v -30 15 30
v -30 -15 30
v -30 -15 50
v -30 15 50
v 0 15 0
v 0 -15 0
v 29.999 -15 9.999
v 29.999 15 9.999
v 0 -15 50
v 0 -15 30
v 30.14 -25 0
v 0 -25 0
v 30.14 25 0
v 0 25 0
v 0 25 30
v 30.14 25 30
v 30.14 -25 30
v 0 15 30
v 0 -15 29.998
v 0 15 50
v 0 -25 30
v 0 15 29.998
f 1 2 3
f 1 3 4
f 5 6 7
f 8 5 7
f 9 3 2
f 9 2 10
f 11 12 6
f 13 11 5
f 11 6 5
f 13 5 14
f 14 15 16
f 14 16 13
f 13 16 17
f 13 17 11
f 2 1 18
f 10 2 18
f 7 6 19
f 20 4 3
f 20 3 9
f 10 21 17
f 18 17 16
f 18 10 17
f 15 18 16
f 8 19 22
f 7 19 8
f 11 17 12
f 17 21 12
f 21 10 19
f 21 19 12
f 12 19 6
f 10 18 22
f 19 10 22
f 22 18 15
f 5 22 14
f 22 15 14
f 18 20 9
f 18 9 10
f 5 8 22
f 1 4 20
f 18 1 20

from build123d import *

# Parameters (mm, degrees)
SKETCH1_W            = 60
SKETCH1_H            = 50
BOSS_EXTRUDE1_DEPTH  = 50
SKETCH2_W            = 30
SKETCH2_H            = 10
CUT_EXTRUDE1_DEPTH   = 50
SKETCH3_W            = 20
SKETCH3_H            = 10
CUT_EXTRUDE2_DEPTH   = 50
SKETCH4_W            = 30
SKETCH4_H            = 30
SKETCH4_H_2          = 20
CUT_EXTRUDE3_DEPTH   = 50
CUT_EXTRUDE7_DEPTH   = 30
CUT_EXTRUDE8_DEPTH   = 30
SKETCH12_W           = 29.999
SKETCH12_H           = 30
CUT_EXTRUDE10_DEPTH  = 0.0001
SKETCH14_W           = 30
SKETCH14_H           = 50
BOSS_EXTRUDE15_DEPTH = 0.14


with BuildPart() as part:
    # Sketch1 → Boss-Extrude1 (new body)
    with BuildSketch(Plane.XY):
        Rectangle(SKETCH1_W, SKETCH1_H)
    extrude(amount=BOSS_EXTRUDE1_DEPTH)

    # Sketch2 → Cut-Extrude1 (cut)
    with BuildSketch(Plane.XY.offset(50)):
        with Locations((-15, 20)):
            Rectangle(SKETCH2_W, SKETCH2_H)
        with Locations((-15, -20)):
            Rectangle(SKETCH2_W, SKETCH2_H)
    extrude(amount=-CUT_EXTRUDE1_DEPTH, mode=Mode.SUBTRACT)

    # Sketch3 → Cut-Extrude2 (cut)
    with BuildSketch(Plane.ZY):
        with Locations((40, 20)):
            Rectangle(SKETCH3_W, SKETCH3_H)
        with Locations((40, -20)):
            Rectangle(SKETCH3_W, SKETCH3_H)
    extrude(amount=-CUT_EXTRUDE2_DEPTH, mode=Mode.SUBTRACT)

    # Sketch4 → Cut-Extrude3 (cut)
    with BuildSketch(Plane(origin=(0, 15, 0), x_dir=(1, 0, 0), z_dir=(0, 1, 0))):
        with Locations((-15, -15)):
            Rectangle(SKETCH4_W, SKETCH4_H)
        with Locations((15, -40)):
            Rectangle(SKETCH4_W, SKETCH4_H_2)
    extrude(amount=-CUT_EXTRUDE3_DEPTH, mode=Mode.SUBTRACT)

    # Sketch9 → Cut-Extrude7 (cut)
    with BuildSketch(Plane(origin=(0, -15, 0), x_dir=(1, 0, 0), z_dir=(0, 1, 0))):
        Polygon((0, 0), (29.999, -9.999), (0, -9.999), align=None)
    extrude(amount=CUT_EXTRUDE7_DEPTH, mode=Mode.SUBTRACT)

    # Sketch10 → Cut-Extrude8 (cut)
    with BuildSketch(Plane(origin=(0, -15, 0), x_dir=(1, 0, 0), z_dir=(0, 1, 0))):
        Polygon((0, -9.9991), (0, -29.9981), (29.999, -9.9991), align=None)
    extrude(amount=CUT_EXTRUDE8_DEPTH, mode=Mode.SUBTRACT)

    # Sketch12 → Cut-Extrude10 (cut)
    with BuildSketch(Plane(origin=(0, 0, 9.999), x_dir=(-1, 0, 0), z_dir=(0, 0, -1))):
        with Locations((-14.9995, 0)):
            Rectangle(SKETCH12_W, SKETCH12_H)
    extrude(amount=-CUT_EXTRUDE10_DEPTH, mode=Mode.SUBTRACT)

    # Sketch14 → Boss-Extrude15 (add)
    with BuildSketch(Plane(origin=(30, 0, 0), x_dir=(0, 0, -1), z_dir=(1, 0, 0))):
        with Locations((-15, 0)):
            Rectangle(SKETCH14_W, SKETCH14_H)
    extrude(amount=BOSS_EXTRUDE15_DEPTH)


solid = part.part
